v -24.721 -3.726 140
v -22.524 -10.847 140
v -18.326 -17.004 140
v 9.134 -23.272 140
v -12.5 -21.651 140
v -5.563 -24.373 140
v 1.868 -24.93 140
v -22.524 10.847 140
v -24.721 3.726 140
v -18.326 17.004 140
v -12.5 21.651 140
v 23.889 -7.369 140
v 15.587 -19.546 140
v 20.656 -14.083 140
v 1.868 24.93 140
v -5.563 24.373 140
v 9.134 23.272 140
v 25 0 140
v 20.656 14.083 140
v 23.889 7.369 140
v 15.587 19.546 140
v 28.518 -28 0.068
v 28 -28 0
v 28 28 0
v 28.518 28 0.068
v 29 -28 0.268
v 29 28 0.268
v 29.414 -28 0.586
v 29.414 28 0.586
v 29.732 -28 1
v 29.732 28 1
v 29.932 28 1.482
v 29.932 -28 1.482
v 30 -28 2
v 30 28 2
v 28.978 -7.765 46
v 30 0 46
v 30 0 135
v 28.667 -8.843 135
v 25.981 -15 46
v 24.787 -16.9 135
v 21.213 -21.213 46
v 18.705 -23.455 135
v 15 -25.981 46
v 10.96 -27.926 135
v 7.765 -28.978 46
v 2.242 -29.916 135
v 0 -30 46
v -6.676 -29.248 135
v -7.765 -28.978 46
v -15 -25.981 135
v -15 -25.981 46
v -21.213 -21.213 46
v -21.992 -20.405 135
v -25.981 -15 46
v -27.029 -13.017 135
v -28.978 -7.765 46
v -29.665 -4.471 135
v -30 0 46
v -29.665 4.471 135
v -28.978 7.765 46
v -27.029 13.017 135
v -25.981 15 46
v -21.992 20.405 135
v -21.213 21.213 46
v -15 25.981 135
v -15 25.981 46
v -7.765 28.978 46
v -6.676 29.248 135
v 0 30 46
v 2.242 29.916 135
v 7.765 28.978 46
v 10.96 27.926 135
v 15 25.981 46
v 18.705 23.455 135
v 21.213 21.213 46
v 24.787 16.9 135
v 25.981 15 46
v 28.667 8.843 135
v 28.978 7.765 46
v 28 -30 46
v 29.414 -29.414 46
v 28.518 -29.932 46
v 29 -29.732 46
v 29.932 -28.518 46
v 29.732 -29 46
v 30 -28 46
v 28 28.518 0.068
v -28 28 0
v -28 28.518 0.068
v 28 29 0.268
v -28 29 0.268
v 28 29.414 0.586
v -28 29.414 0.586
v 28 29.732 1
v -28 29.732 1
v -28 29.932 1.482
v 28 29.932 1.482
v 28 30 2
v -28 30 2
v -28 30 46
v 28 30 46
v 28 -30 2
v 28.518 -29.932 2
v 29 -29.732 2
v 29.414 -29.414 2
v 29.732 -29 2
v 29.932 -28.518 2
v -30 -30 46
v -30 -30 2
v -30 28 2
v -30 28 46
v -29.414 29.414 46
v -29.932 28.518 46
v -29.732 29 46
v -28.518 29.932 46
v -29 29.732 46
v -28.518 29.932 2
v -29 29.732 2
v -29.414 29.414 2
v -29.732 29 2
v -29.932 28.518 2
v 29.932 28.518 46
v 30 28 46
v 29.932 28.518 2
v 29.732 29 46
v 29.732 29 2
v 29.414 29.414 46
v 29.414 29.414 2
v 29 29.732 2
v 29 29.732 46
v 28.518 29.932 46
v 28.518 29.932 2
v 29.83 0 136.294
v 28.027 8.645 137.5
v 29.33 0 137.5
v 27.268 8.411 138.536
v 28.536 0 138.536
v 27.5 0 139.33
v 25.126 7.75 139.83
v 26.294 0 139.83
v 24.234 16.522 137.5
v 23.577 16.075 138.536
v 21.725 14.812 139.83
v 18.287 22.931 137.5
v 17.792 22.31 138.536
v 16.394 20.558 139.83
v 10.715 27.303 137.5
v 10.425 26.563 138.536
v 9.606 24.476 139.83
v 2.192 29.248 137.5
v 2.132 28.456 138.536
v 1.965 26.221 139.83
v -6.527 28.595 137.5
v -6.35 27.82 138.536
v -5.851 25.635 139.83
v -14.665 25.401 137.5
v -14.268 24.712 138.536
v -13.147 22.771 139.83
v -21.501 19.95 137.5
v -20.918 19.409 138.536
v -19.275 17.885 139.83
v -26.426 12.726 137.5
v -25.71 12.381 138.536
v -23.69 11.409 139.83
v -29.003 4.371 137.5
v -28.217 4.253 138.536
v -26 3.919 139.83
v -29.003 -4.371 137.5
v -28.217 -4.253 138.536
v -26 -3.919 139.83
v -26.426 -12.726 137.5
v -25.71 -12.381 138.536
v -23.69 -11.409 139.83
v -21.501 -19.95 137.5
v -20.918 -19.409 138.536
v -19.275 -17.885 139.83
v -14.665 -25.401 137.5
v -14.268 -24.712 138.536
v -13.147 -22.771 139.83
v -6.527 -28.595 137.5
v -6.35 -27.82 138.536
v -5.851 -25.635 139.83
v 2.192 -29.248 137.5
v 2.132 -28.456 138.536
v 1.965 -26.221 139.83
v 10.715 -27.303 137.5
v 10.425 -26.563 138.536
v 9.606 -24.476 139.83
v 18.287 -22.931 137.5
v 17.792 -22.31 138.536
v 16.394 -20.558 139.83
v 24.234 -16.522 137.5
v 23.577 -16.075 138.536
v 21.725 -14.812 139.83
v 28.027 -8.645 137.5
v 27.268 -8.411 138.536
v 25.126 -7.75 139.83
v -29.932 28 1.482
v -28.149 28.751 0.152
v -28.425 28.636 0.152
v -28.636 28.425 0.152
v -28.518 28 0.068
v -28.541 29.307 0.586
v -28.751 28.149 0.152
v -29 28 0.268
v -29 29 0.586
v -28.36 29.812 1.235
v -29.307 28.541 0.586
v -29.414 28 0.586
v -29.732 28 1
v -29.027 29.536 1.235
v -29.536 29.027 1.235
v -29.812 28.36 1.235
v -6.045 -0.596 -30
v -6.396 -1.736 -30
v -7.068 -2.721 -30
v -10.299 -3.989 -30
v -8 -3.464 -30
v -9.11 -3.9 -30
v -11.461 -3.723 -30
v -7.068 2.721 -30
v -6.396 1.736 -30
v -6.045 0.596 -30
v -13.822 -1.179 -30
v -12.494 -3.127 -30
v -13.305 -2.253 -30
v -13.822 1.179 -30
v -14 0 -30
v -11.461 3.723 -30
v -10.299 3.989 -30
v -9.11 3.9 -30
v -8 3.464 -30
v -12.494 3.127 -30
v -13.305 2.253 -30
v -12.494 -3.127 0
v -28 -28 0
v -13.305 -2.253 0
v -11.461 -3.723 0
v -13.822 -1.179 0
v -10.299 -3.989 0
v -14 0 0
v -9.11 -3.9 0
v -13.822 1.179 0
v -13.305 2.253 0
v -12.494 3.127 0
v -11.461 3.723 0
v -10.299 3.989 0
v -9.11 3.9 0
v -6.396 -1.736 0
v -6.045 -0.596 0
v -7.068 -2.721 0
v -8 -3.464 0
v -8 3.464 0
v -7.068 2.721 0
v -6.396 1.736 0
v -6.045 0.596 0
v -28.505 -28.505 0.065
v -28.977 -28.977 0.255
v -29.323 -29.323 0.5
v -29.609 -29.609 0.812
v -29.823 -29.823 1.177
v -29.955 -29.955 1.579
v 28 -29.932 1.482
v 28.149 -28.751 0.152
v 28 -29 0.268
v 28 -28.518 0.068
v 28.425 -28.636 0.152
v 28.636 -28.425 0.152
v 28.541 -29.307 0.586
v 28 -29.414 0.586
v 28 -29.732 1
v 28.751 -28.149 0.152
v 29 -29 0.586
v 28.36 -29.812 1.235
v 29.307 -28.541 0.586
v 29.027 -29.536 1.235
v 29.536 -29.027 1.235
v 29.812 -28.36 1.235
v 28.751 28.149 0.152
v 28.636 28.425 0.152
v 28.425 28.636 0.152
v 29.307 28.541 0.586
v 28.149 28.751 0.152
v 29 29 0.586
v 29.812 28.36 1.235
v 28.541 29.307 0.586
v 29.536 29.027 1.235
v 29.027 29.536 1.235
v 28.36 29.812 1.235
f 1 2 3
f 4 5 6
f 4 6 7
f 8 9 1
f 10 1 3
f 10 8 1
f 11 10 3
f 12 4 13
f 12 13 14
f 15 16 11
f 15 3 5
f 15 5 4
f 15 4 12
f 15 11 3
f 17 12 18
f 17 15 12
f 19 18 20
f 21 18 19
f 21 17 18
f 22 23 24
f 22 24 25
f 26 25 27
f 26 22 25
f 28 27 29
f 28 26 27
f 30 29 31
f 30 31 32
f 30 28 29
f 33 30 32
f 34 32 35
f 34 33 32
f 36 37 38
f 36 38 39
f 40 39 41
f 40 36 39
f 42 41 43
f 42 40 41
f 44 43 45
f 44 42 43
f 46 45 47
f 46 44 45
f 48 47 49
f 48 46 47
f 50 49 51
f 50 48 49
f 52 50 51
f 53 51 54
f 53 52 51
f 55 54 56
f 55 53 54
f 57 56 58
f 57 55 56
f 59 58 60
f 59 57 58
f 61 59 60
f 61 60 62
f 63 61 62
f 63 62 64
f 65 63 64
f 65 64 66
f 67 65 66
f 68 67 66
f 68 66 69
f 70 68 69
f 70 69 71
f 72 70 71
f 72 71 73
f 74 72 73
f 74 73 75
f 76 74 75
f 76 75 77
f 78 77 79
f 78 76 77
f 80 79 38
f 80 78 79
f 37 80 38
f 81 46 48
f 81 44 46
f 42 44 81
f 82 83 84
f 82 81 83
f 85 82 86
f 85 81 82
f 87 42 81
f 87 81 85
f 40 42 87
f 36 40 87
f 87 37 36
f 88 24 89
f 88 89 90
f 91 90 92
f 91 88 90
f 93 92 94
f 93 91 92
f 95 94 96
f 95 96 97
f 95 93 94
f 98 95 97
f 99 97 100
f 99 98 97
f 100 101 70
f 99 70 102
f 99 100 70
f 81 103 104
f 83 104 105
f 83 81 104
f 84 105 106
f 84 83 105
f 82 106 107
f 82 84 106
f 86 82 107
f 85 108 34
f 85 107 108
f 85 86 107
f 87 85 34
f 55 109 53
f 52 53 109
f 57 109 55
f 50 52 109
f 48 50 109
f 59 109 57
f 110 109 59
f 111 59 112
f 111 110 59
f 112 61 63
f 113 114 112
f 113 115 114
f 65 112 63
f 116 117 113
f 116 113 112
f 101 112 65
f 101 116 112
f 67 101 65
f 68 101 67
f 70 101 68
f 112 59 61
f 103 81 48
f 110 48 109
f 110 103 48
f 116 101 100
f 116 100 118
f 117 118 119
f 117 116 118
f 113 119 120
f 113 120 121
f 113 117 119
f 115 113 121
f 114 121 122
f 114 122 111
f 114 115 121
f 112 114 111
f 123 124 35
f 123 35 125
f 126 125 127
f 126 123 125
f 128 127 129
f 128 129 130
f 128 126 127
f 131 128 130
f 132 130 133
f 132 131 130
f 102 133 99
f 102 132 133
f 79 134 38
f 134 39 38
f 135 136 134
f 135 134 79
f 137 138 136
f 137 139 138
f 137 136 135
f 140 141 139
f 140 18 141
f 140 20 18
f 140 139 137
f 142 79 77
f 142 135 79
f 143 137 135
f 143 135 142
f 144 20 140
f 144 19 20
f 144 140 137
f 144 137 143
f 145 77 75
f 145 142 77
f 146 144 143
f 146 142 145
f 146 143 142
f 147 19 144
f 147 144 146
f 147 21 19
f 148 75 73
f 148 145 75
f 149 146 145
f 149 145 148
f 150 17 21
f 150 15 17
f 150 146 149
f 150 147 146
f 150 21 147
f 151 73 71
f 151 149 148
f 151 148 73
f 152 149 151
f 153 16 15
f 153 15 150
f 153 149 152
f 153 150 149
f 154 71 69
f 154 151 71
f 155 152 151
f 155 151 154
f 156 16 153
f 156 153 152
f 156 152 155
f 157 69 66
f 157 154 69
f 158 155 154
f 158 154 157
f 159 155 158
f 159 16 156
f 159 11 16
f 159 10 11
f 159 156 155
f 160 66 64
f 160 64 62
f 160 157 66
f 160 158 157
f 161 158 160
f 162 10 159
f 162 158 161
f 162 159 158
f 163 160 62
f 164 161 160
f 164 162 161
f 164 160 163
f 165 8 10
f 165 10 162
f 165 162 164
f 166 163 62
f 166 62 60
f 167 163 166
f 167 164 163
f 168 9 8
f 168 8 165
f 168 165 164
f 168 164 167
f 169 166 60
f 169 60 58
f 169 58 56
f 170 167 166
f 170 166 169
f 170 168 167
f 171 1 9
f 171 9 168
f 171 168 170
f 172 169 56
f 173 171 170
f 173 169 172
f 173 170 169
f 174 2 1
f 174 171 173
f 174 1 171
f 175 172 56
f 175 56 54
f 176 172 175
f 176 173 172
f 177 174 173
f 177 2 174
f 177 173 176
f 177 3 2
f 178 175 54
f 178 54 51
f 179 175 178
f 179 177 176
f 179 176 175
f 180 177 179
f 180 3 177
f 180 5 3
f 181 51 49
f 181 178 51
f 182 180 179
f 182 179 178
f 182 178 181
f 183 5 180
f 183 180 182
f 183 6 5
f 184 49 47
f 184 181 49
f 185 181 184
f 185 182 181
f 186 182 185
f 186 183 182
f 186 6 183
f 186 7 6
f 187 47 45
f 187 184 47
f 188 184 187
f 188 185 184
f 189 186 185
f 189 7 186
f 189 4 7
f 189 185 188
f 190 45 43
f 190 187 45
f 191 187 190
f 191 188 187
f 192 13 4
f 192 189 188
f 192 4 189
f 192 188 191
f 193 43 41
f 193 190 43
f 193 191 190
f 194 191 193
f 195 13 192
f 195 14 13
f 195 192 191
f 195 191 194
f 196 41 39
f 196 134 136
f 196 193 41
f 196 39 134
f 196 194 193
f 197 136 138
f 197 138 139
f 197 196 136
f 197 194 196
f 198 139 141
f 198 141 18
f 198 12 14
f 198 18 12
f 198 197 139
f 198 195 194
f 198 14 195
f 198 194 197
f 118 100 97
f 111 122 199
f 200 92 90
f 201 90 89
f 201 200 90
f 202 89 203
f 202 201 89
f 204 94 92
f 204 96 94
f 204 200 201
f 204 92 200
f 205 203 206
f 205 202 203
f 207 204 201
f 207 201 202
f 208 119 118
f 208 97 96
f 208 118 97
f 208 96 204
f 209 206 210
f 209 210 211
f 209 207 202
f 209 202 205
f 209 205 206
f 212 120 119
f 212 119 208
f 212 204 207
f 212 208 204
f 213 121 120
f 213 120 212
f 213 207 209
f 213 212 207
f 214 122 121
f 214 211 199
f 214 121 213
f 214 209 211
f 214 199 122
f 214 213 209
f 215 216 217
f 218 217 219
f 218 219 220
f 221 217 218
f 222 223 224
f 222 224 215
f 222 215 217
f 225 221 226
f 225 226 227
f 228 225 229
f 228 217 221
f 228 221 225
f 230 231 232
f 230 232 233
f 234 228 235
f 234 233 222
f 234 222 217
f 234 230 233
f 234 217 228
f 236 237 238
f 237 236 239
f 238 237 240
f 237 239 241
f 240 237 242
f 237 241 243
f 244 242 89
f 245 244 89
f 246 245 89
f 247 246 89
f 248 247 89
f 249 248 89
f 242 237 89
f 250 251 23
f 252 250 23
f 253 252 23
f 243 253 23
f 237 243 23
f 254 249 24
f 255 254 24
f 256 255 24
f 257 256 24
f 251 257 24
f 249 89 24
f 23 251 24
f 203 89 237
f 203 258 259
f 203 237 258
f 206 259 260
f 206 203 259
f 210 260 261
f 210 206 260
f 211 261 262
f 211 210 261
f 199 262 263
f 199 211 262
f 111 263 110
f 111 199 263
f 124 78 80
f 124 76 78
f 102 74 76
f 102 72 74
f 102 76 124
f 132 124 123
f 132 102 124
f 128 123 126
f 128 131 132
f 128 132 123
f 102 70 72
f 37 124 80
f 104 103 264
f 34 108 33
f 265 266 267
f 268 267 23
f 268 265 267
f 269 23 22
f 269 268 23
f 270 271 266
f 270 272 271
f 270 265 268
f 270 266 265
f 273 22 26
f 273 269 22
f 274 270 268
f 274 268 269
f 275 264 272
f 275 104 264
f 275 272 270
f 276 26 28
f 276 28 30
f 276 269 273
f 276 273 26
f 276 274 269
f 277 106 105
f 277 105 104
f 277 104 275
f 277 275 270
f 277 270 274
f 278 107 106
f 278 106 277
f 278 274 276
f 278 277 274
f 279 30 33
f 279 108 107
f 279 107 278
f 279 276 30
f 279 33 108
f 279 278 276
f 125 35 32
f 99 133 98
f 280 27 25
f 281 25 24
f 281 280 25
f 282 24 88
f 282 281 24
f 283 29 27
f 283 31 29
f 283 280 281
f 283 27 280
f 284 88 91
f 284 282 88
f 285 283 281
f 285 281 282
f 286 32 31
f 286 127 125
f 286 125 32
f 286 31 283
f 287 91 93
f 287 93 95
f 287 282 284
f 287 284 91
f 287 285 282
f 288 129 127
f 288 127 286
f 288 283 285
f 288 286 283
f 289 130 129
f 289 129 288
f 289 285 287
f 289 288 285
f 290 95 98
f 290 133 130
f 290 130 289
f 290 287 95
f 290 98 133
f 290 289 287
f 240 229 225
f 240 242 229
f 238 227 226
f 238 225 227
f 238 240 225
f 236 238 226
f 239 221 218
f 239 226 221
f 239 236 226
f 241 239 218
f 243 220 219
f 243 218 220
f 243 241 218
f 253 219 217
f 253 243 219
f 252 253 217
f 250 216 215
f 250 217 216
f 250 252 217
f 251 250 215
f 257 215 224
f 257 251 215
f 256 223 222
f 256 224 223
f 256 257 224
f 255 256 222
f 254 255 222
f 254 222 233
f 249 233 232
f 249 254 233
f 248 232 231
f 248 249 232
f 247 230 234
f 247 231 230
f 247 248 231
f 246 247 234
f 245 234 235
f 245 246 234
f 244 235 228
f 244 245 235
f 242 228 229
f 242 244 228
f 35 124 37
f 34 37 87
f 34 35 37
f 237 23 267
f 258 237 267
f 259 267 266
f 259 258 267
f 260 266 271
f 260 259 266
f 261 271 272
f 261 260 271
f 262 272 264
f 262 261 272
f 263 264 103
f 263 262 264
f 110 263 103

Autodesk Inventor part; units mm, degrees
ref_plane "YZ Plane" through (0, 0, 0) normal (1, 0, 0) x (0, 1, 0)
ref_plane "XZ Plane" through (0, 0, 0) normal (0, 1, 0) x (-1, 0, 0)
ref_plane "XY Plane" through (0, 0, 0) normal (0, 0, 1) x (1, 0, 0)
sketch "Sketch1" plane through (0, 0, 0) normal (0, 0, 1) x (1, 0, 0)
  line L0 (-30, 30) -> (30, 30)
  line L1 (30, 30) -> (30, -30)
  line L2 (30, -30) -> (-30, -30)
  line L3 (-30, -30) -> (-30, 30)
  point P0 (0, 0)
  dimension "d0" = 60
  dimension "d1" = 60
  dimension "d2" = 30
  dimension "d3" = 30
extrude "Extrusion1" add sketch "Sketch1" along normal blind 46
sketch "Sketch2" plane through (0, 0, 46) normal (0, 0, 1) x (1, 0, 0)
  circle A0 centre (0, 0) radius 30
  dimension "d14" = 60
extrude "Extrusion2" add sketch "Sketch2" along normal blind 94
fillet "Fillet1" radius 5 1 edges at (-30, 0, 140)
fillet "Fillet2" radius 2 7 edges at (30, 30, 23) (30, -30, 23) (30, 0, 0) (-30, 30, 23) (0, 30, 0) (-30, 0, 0) (0, -30, 0)
sketch "Sketch3" plane through (0, 0, 0) normal (0, 0, -1) x (-1, 0, 0)
  line L0 (30, -30) -> (30, 28) projected
  line L1 (30, 0) -> (10, 0)
  circle A0 centre (10, 0) radius 4
  point P0 (0, 0)
  dimension "d10" = 20
  dimension "d11" = 8
  dimension "d15" = 0
extrude "Extrusion3" add sketch "Sketch3" along normal blind 30
equation "\"d2\" = 0.5 * d0"
equation "\"d3\" = 0.5 * d1"
properties part number "Motor"
